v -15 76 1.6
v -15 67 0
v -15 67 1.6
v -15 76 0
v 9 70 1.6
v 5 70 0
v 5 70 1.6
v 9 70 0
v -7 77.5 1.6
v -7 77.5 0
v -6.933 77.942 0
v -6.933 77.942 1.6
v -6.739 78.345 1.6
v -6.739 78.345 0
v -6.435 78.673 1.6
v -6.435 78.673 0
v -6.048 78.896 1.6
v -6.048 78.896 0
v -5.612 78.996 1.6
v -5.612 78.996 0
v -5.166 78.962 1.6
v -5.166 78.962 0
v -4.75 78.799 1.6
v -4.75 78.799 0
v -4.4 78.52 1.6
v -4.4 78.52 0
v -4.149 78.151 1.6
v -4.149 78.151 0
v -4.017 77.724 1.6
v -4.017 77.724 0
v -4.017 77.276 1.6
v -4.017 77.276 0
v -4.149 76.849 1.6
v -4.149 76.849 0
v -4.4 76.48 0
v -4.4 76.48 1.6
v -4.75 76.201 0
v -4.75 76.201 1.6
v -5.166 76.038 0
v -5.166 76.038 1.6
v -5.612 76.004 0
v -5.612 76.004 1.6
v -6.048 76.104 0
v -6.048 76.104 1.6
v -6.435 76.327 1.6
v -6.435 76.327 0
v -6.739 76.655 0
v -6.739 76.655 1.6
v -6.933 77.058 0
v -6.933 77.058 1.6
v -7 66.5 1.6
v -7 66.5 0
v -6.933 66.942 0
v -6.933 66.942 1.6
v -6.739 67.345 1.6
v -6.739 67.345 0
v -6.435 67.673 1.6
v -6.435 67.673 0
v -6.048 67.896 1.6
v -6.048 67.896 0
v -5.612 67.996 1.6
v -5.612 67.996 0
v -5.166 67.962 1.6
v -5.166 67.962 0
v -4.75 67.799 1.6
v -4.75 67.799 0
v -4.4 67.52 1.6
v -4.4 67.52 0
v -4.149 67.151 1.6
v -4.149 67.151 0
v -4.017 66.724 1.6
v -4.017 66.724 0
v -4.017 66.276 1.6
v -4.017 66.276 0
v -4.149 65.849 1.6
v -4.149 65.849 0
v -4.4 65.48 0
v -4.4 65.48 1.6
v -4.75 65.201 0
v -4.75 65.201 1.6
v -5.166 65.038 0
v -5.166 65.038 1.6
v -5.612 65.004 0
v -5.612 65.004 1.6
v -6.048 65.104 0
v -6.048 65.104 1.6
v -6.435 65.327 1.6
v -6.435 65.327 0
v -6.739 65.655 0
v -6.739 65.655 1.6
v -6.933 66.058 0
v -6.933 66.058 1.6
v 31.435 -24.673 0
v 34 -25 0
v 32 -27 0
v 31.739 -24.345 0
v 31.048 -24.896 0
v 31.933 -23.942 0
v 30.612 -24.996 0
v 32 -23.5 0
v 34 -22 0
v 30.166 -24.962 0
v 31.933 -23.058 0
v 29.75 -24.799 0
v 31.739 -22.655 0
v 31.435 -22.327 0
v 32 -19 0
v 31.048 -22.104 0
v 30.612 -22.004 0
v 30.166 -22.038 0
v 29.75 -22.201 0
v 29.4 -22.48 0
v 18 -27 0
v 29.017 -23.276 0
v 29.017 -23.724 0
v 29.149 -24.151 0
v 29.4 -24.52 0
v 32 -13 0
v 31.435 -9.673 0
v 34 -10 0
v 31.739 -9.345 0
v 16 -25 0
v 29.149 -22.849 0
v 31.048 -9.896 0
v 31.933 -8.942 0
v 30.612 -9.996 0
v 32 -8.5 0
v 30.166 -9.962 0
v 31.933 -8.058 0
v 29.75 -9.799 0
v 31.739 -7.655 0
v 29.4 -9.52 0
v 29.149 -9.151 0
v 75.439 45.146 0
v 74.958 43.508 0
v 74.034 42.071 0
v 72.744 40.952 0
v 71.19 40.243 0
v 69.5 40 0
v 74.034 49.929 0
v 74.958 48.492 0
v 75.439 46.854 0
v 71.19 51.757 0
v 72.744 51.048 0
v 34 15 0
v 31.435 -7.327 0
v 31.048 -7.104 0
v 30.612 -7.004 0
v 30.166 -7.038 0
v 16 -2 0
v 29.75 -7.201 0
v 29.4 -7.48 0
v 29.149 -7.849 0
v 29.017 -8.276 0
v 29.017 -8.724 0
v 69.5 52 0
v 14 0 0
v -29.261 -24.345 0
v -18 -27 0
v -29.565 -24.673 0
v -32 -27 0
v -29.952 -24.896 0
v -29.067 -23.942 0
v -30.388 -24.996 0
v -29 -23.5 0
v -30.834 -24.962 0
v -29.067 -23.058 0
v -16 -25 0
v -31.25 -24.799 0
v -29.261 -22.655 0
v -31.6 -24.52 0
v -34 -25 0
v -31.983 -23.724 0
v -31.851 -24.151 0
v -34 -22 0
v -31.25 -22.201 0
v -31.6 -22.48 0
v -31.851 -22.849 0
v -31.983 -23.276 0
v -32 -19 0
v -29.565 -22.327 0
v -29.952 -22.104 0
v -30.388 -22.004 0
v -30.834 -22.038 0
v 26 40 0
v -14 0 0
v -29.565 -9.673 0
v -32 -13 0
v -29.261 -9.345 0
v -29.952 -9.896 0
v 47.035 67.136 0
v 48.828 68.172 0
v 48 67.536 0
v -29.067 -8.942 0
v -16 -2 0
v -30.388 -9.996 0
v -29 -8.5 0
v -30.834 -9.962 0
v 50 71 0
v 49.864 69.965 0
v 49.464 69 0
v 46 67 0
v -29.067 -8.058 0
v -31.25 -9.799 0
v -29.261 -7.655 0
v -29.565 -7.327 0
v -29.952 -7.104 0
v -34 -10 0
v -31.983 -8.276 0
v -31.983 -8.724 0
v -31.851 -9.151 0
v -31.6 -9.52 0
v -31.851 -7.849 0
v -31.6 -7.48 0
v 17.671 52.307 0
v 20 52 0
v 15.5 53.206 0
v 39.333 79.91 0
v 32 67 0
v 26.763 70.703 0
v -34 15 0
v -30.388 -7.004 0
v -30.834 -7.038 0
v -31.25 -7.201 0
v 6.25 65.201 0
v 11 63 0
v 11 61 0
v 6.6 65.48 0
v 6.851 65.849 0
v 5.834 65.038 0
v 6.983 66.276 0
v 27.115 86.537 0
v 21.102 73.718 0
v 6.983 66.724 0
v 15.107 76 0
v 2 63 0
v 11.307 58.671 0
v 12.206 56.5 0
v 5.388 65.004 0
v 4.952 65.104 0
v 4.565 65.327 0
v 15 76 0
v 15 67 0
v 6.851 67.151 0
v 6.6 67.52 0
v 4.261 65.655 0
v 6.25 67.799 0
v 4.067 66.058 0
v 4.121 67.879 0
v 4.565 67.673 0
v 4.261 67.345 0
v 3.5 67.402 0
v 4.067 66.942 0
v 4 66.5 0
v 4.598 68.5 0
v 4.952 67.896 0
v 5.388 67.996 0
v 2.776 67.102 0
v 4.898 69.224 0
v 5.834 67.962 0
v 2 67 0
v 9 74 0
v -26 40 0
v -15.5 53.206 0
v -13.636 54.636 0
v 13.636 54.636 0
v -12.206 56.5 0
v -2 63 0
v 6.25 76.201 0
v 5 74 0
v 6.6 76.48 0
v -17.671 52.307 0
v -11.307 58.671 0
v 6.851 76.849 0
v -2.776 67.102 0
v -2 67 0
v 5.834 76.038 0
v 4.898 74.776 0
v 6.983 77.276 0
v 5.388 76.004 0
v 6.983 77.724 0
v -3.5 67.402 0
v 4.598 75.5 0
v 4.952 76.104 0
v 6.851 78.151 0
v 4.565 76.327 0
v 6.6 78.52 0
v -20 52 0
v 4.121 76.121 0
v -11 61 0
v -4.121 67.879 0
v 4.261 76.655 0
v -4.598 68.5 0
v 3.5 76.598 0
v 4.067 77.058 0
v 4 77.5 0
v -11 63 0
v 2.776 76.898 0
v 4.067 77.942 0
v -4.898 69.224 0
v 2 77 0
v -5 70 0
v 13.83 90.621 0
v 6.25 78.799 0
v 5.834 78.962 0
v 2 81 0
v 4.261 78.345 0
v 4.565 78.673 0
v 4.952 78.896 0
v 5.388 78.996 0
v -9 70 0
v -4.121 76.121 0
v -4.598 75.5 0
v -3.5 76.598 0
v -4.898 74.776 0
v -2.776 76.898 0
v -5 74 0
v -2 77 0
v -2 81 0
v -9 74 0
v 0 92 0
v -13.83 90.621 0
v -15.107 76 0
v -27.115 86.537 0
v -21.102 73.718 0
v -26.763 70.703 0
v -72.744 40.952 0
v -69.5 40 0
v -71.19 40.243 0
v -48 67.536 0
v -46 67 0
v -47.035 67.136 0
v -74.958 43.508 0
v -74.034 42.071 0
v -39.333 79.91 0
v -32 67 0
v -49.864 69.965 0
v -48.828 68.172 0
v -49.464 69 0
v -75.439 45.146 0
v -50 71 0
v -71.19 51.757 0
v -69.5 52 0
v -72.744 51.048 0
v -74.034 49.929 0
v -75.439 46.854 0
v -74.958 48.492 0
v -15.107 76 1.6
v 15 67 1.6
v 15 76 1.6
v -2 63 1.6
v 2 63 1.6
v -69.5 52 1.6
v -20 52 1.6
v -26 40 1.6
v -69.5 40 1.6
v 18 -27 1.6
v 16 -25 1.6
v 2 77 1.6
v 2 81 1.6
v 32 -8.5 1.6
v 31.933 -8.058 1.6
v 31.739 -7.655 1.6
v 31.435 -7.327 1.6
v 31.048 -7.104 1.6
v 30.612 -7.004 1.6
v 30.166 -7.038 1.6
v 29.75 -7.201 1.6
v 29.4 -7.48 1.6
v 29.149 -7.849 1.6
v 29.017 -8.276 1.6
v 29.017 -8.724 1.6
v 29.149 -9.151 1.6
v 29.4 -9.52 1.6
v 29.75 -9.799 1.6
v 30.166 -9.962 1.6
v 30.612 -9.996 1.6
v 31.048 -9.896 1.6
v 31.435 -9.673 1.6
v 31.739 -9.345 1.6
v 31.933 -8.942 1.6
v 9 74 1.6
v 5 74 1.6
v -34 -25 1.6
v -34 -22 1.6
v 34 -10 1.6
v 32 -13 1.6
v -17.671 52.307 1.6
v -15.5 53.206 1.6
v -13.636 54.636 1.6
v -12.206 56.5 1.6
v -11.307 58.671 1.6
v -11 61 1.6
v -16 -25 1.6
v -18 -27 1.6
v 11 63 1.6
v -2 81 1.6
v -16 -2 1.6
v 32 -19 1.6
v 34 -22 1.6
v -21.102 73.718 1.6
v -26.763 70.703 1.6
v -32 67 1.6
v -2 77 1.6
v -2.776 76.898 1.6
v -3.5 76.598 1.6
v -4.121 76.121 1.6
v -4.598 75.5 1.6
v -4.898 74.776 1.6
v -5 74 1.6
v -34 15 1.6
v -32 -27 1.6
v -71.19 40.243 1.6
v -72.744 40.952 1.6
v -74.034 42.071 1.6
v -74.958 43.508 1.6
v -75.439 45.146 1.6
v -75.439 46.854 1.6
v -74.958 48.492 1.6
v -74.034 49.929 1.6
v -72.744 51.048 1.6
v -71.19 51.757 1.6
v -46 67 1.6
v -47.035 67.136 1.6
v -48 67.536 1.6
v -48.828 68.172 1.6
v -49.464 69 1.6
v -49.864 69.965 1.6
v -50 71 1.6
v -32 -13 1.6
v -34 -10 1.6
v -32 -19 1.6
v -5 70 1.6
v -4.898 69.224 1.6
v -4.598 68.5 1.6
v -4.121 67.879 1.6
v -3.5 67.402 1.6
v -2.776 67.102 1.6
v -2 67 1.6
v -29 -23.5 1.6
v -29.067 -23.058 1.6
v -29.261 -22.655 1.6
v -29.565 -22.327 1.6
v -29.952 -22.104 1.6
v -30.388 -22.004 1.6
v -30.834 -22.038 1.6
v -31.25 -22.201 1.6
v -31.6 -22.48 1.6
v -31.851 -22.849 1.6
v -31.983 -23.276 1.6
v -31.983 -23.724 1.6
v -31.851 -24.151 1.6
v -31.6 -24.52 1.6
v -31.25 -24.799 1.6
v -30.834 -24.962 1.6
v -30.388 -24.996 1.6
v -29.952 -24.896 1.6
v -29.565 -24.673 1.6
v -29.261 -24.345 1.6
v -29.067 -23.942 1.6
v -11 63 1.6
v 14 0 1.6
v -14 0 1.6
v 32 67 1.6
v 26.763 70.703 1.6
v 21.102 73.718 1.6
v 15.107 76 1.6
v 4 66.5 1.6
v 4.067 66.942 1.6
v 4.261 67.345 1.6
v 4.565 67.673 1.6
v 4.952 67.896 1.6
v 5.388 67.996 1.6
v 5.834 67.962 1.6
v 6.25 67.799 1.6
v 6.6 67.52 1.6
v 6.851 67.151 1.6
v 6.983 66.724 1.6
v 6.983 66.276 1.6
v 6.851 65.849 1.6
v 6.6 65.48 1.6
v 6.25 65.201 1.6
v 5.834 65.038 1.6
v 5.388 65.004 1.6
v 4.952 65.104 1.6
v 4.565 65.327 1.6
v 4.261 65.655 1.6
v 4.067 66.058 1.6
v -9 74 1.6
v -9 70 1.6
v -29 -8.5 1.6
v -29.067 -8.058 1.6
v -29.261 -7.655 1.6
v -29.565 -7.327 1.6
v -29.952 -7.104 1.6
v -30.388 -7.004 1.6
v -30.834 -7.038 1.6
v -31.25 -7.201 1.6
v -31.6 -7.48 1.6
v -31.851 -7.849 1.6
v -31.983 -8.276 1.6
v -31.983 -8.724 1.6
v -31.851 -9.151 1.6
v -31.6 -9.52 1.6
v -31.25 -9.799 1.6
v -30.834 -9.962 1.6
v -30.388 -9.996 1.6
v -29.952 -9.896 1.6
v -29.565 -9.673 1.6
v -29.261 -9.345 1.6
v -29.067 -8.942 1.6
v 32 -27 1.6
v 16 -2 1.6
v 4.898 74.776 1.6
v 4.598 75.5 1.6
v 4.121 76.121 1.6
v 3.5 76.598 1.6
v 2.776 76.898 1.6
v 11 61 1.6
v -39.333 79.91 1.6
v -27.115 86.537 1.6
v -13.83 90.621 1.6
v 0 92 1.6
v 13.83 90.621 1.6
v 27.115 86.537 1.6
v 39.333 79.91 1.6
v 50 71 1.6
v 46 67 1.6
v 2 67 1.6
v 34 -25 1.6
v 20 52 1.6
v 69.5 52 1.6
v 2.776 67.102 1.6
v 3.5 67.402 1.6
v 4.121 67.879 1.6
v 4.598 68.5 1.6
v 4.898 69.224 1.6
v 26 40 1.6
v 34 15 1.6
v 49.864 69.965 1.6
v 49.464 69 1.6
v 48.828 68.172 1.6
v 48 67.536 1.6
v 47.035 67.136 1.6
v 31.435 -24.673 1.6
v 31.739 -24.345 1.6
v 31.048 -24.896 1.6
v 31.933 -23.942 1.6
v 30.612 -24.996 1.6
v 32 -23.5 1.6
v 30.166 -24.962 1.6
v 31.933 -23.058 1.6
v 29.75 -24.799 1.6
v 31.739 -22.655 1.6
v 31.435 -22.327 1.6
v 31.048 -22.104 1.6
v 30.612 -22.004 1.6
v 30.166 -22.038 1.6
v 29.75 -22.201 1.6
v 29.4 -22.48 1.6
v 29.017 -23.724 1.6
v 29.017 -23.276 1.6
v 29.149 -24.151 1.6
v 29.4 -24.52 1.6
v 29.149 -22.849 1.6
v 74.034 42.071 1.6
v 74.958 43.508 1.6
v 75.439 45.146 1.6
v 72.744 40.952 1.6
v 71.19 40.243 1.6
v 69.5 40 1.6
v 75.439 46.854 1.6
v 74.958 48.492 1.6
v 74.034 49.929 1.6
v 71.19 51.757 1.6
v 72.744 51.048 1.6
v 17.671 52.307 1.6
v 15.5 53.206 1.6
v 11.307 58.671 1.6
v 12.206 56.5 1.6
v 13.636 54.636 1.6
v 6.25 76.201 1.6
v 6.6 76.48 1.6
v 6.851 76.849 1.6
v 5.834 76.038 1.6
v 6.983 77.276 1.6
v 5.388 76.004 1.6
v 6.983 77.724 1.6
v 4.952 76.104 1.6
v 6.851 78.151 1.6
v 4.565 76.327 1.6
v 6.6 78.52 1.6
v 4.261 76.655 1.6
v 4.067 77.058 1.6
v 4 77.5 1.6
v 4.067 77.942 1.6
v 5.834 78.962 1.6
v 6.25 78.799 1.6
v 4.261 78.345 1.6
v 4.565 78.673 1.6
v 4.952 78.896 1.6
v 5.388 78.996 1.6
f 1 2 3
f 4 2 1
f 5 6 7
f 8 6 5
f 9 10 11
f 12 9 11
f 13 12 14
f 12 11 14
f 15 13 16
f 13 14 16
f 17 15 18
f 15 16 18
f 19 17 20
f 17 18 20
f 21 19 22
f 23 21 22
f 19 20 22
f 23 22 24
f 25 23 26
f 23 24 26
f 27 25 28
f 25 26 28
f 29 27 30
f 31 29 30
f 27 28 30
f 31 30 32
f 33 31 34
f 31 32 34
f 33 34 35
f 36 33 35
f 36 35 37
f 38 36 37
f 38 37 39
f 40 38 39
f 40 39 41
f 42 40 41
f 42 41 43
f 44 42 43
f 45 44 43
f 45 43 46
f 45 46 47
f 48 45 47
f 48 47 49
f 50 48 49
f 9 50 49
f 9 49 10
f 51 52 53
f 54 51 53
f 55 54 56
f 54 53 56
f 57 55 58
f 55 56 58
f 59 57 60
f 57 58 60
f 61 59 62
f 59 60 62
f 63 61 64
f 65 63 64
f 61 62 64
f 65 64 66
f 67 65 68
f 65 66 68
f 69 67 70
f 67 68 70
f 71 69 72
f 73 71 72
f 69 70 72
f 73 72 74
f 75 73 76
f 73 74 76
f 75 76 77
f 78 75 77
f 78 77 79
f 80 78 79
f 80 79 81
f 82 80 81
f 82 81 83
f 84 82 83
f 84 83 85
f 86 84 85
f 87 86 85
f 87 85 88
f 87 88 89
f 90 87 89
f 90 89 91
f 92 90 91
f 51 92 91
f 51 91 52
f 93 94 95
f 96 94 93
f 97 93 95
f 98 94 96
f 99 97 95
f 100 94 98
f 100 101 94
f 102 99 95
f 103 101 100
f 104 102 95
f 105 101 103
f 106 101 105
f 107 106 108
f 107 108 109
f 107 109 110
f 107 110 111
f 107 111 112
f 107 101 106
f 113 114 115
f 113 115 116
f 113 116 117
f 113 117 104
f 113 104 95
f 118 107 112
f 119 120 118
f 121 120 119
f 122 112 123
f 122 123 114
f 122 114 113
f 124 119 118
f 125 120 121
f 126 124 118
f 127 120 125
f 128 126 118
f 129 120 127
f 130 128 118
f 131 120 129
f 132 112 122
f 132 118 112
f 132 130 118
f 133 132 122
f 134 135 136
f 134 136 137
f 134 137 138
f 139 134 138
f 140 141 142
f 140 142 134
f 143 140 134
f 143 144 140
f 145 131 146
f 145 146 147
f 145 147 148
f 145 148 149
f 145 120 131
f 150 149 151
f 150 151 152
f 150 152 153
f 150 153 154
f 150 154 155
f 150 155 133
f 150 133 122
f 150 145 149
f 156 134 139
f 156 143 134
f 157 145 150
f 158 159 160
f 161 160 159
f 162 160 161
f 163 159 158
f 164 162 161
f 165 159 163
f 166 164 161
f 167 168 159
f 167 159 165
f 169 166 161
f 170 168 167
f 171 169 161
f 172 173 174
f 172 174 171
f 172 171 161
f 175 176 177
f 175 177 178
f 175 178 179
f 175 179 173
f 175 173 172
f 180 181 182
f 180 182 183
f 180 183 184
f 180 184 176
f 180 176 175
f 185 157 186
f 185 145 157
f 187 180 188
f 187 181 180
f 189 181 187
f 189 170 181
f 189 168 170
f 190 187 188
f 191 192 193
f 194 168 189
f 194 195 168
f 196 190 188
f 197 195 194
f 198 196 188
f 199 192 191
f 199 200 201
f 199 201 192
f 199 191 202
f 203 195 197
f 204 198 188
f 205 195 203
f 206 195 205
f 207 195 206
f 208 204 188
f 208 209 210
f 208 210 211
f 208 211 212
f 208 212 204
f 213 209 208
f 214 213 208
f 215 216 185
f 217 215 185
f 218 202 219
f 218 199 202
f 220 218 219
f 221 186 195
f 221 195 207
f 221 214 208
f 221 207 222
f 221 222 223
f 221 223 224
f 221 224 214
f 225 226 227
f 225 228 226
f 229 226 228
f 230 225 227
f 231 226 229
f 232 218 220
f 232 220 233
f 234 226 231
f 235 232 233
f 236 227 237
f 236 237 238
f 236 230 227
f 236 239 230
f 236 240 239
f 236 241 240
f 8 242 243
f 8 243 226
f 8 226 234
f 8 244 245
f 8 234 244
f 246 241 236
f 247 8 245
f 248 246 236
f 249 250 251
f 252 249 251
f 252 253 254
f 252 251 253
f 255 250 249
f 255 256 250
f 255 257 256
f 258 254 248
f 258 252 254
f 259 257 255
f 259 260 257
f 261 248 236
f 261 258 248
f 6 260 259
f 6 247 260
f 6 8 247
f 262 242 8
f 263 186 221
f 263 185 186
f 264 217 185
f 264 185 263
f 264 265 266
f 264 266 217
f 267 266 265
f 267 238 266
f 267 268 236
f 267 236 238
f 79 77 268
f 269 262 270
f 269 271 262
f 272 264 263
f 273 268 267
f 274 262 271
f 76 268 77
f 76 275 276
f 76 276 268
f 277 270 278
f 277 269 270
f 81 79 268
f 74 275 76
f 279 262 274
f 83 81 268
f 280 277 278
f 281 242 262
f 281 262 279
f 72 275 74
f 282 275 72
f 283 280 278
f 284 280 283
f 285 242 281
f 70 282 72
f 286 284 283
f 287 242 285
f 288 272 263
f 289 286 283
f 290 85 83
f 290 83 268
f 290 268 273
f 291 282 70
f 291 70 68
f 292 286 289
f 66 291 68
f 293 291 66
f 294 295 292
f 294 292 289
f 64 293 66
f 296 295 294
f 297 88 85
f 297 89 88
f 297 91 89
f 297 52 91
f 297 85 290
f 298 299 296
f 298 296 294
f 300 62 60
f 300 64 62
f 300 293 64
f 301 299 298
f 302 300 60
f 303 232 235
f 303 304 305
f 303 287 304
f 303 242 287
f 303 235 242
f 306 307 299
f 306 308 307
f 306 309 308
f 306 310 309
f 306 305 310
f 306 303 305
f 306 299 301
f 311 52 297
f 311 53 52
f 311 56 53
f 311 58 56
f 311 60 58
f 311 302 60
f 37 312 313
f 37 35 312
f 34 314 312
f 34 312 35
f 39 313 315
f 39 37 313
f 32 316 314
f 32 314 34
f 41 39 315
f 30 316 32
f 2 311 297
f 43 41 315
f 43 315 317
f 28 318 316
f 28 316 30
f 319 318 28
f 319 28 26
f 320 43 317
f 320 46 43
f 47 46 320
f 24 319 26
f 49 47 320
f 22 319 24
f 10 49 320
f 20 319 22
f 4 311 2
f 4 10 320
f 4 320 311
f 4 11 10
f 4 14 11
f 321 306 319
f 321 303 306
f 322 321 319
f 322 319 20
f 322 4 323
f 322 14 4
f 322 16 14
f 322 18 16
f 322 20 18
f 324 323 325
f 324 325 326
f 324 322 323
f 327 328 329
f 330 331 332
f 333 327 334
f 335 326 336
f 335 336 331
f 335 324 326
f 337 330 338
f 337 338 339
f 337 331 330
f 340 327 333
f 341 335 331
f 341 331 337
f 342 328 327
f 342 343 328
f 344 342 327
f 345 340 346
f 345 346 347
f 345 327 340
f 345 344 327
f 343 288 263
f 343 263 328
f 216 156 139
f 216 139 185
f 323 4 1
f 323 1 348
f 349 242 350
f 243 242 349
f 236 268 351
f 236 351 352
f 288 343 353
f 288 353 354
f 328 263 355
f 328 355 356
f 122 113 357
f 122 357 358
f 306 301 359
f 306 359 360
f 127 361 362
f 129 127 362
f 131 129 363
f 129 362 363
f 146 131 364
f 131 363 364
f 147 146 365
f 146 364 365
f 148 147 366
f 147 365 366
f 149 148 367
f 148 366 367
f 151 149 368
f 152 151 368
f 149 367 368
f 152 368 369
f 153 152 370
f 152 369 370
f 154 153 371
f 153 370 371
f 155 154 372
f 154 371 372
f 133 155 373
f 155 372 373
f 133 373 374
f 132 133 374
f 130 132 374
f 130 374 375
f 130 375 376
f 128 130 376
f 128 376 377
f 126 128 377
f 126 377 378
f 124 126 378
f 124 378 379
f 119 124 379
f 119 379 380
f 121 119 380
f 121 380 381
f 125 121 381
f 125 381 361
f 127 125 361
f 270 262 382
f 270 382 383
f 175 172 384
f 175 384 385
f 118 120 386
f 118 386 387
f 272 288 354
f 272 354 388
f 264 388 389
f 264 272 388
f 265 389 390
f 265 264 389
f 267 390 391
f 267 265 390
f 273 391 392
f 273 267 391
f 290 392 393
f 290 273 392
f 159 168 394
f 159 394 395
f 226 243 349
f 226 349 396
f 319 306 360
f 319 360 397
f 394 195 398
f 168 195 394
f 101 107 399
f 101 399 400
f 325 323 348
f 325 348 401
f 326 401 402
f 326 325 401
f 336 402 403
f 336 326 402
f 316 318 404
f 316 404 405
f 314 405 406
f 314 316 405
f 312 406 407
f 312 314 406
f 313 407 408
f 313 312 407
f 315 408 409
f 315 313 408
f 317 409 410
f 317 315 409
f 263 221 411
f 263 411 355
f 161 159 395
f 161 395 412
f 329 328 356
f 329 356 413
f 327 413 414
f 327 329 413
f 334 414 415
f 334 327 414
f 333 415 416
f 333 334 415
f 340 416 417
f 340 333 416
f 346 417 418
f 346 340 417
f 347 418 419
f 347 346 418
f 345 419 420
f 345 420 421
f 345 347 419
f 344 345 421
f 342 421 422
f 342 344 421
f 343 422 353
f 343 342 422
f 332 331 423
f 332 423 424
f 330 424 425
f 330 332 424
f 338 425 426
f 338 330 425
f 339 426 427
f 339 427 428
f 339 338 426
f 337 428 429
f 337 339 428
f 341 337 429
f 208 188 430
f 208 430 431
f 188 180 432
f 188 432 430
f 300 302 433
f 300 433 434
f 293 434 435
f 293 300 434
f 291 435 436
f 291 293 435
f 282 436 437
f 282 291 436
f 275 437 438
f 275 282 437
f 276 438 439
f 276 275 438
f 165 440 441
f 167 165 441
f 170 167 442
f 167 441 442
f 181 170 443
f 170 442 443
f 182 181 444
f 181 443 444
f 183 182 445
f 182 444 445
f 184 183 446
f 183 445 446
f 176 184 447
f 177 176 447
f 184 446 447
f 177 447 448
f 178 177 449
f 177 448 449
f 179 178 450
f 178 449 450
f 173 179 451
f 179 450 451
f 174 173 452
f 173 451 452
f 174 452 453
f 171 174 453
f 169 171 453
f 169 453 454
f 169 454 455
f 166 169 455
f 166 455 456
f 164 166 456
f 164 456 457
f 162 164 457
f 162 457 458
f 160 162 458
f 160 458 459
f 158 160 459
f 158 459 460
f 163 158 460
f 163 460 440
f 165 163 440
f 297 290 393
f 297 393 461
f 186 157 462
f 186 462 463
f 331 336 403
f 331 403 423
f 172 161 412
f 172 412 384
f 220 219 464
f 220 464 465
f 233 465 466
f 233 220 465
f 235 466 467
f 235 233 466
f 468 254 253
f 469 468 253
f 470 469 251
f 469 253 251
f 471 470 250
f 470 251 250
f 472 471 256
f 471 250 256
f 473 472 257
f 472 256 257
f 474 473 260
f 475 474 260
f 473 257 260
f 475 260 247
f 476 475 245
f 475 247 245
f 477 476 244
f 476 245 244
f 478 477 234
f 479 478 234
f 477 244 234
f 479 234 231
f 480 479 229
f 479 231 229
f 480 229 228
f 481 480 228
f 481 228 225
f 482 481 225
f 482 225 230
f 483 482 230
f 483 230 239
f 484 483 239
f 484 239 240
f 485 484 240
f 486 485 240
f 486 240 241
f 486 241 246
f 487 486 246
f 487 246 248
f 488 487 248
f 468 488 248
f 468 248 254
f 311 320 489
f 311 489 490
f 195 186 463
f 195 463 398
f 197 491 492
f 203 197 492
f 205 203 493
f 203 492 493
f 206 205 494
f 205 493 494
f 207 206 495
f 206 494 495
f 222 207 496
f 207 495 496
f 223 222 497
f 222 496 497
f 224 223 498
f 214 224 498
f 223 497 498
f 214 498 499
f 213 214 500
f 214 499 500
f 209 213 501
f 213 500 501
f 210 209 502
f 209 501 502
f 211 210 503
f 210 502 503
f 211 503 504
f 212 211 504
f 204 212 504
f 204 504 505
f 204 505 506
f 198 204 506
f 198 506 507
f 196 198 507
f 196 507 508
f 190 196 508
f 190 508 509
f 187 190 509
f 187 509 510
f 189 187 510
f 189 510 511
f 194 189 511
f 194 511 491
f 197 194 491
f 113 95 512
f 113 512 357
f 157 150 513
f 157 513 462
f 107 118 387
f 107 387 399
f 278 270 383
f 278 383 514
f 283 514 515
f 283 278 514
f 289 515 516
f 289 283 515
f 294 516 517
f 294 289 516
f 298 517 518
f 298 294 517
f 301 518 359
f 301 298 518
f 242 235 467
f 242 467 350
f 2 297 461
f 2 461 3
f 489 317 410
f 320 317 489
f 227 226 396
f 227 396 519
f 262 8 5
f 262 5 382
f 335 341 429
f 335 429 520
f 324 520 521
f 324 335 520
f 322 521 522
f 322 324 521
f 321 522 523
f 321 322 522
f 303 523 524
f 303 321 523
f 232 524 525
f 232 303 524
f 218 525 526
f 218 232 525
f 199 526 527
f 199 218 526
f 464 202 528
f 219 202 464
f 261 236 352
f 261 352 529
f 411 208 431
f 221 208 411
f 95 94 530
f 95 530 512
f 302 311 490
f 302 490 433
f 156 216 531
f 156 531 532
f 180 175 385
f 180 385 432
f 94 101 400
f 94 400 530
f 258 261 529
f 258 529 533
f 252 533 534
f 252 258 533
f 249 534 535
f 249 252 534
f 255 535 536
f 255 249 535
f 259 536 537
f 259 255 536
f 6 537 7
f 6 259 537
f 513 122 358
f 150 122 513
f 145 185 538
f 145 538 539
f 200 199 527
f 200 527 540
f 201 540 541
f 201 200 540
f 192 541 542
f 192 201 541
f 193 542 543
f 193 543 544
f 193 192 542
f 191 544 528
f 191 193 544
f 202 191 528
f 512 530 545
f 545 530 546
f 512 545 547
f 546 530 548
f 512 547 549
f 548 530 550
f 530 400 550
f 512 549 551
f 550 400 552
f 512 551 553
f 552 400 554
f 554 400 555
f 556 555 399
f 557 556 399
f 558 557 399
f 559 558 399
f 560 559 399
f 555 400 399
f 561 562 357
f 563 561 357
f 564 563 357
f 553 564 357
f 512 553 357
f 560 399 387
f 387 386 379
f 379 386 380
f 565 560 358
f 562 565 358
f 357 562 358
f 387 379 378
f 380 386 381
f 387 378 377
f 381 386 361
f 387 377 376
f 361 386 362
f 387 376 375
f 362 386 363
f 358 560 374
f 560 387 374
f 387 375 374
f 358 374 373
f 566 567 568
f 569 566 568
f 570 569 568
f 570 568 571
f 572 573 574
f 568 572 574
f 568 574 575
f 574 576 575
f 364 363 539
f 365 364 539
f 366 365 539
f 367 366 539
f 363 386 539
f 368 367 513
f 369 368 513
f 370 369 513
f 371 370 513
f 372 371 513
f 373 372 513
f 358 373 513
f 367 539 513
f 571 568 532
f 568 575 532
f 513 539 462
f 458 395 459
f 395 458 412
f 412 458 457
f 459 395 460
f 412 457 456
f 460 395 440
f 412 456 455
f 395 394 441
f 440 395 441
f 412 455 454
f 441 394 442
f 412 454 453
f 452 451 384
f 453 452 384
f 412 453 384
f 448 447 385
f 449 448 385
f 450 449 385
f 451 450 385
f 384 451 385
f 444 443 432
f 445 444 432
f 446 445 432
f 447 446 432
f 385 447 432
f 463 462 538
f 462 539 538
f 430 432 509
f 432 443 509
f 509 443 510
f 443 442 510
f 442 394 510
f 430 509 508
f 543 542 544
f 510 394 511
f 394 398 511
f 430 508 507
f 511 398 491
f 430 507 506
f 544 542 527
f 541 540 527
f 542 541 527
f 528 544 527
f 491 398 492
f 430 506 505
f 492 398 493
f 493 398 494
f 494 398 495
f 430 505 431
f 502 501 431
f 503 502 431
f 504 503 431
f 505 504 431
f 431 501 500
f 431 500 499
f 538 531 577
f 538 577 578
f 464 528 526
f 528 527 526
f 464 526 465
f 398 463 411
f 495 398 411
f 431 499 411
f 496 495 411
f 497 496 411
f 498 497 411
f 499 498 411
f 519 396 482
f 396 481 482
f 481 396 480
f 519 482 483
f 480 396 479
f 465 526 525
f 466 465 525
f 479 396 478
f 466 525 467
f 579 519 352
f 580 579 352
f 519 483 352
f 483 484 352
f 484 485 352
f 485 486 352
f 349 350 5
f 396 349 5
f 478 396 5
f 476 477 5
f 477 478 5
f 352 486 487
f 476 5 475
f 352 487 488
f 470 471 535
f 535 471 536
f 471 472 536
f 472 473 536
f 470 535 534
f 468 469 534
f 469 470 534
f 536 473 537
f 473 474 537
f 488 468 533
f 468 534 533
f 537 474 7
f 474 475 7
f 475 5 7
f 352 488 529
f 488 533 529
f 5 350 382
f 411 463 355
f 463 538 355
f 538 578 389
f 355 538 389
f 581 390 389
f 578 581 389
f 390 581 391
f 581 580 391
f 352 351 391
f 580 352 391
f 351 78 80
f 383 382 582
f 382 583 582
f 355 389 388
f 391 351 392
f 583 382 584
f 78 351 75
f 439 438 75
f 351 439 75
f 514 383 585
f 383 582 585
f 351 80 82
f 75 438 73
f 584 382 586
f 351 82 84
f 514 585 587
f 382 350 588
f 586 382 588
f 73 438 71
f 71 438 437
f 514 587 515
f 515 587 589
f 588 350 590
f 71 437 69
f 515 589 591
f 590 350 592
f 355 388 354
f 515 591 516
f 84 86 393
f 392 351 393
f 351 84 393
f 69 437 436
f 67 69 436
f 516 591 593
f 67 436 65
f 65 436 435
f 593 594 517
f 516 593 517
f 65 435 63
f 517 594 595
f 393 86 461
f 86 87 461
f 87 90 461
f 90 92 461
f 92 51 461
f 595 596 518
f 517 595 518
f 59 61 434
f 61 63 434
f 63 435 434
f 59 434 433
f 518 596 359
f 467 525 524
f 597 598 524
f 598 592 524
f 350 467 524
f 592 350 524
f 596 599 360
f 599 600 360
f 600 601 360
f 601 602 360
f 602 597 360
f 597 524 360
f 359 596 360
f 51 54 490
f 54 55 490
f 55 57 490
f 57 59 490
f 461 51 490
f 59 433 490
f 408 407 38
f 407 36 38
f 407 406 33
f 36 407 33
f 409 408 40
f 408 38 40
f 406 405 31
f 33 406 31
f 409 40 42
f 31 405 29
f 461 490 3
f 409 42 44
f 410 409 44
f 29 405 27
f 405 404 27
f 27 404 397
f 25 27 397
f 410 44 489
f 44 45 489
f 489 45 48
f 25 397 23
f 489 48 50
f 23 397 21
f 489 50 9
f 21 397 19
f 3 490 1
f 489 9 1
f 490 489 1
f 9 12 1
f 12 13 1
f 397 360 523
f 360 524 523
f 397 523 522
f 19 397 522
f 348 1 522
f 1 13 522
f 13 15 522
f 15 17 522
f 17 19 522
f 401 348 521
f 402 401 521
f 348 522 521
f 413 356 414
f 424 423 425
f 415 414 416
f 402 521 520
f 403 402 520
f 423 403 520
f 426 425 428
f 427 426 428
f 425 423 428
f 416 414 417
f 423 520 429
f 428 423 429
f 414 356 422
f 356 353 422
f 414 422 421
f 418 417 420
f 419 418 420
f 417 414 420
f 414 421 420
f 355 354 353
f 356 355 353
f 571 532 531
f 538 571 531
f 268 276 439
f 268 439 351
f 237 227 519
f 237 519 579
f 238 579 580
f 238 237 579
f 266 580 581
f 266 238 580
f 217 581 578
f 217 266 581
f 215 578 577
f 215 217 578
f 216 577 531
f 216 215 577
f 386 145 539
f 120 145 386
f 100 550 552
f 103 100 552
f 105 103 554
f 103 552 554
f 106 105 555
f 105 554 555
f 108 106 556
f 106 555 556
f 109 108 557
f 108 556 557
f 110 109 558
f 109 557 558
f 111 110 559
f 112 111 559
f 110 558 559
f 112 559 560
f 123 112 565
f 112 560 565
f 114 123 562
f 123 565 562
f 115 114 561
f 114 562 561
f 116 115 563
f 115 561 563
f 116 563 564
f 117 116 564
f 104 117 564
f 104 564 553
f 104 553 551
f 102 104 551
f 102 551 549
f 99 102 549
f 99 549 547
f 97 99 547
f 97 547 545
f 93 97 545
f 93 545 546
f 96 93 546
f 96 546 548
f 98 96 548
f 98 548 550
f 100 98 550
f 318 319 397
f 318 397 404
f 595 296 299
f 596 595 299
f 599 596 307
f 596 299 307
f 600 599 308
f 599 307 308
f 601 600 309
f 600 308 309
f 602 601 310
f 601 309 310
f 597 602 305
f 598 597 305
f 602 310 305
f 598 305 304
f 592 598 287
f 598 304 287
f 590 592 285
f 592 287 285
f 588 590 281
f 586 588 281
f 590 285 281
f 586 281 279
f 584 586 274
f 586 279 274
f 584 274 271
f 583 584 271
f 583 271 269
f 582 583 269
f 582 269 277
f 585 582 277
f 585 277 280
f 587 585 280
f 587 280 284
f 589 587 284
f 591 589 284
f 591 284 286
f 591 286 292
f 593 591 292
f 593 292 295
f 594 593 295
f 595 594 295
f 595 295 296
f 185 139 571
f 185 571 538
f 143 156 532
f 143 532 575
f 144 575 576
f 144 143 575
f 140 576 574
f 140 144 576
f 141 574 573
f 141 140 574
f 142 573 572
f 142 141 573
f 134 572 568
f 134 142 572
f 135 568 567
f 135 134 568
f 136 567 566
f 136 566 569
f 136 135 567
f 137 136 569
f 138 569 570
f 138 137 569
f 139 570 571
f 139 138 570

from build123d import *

# Parameters (mm, degrees)
RESSALTO_EXTRUS_O1_DEPTH = 1.6
ESBO_O2_R                = 1.5
CORTE_EXTRUS_O2_DEPTH    = 2
ESBO_O3_R                = 1.5
CORTE_EXTRUS_O3_DEPTH    = 10
ESBO_O4_R                = 1.5
CORTE_EXTRUS_O4_DEPTH    = 10


with BuildPart() as part:
    # Esboço1 → Ressalto-extrusão1 (new body)
    with BuildSketch(Plane.XY):
        with BuildLine():
            Line((14, 0), (-14, 0))
            Line((-14, 0), (-16, -2))
            Line((-16, -2), (-16, -25))
            Line((-16, -25), (-18, -27))
            Line((-18, -27), (-32, -27))
            Line((-32, -27), (-34, -25))
            Line((-34, -25), (-34, -22))
            Line((-34, -22), (-32, -19))
            Line((-32, -19), (-32, -13))
            Line((-32, -13), (-34, -10))
            Line((-34, -10), (-34, 15))
            Line((-34, 15), (-26, 40))
            Line((-26, 40), (-69.5, 40))
            ThreePointArc((-69.5, 40), (-75.5, 46), (-69.5, 52))
            Line((-69.5, 52), (-20, 52))
            ThreePointArc((-20, 52), (-13.636038969, 54.636038969), (-11, 61))
            Line((-11, 61), (-11, 63))
            Line((-11, 63), (-15, 67))
            Line((-15, 67), (-15, 76))
            Line((-15, 76), (-15.107398643, 76))
            ThreePointArc((-15.107398643, 76), (-23.979715422, 72.299613351), (-32, 67))
            Line((-32, 67), (-46, 67))
            ThreePointArc((-46, 67), (-48.828427125, 68.171572875), (-50, 71))
            ThreePointArc((-50, 71), (0, 92), (50, 71))
            ThreePointArc((50, 71), (48.828427125, 68.171572875), (46, 67))
            Line((46, 67), (32, 67))
            ThreePointArc((32, 67), (23.979715422, 72.299613351), (15.107398643, 76))
            Line((15.107398643, 76), (15, 76))
            Line((15, 76), (15, 67))
            Line((15, 67), (11, 63))
            Line((11, 63), (11, 61))
            ThreePointArc((11, 61), (13.636038969, 54.636038969), (20, 52))
            Line((20, 52), (69.5, 52))
            ThreePointArc((69.5, 52), (75.5, 46), (69.5, 40))
            Line((69.5, 40), (26, 40))
            Line((26, 40), (34, 15))
            Line((34, 15), (34, -10))
            Line((34, -10), (32, -13))
            Line((32, -13), (32, -19))
            Line((32, -19), (34, -22))
            Line((34, -22), (34, -25))
            Line((34, -25), (32, -27))
            Line((32, -27), (18, -27))
            Line((18, -27), (16, -25))
            Line((16, -25), (16, -2))
            Line((16, -2), (14, 0))
        make_face()
    extrude(amount=RESSALTO_EXTRUS_O1_DEPTH)

    # Esboço2 → Corte-extrusão2 (cut)
    with BuildSketch(Plane(origin=(0, 0, 0), x_dir=(-1, 0, 0), z_dir=(0, 0, -1))):
        with Locations((5.5, 66.5)):
            Circle(ESBO_O2_R)
        with Locations((-5.5, 66.5)):
            Circle(ESBO_O2_R)
        with Locations((-5.5, 77.5)):
            Circle(ESBO_O2_R)
        with Locations((5.5, 77.5)):
            Circle(ESBO_O2_R)
        with BuildLine():
            Line((-5, 70), (-9, 70))
            Line((-9, 70), (-9, 74))
            Line((-9, 74), (-5, 74))
            ThreePointArc((-5, 74), (-4.121320344, 76.121320344), (-2, 77))
            Line((-2, 77), (-2, 81))
            Line((-2, 81), (2, 81))
            Line((2, 81), (2, 77))
            ThreePointArc((2, 77), (4.121320344, 76.121320344), (5, 74))
            Line((5, 74), (9, 74))
            Line((9, 74), (9, 70))
            Line((9, 70), (5, 70))
            ThreePointArc((5, 70), (4.121320344, 67.878679656), (2, 67))
            Line((2, 67), (2, 63))
            Line((2, 63), (-2, 63))
            Line((-2, 63), (-2, 67))
            ThreePointArc((-2, 67), (-4.121320344, 67.878679656), (-5, 70))
        make_face()
    extrude(amount=-CORTE_EXTRUS_O2_DEPTH, mode=Mode.SUBTRACT)

    # Esboço3 → Corte-extrusão3 (cut)
    with BuildSketch(Plane.XY.offset(1.6)):
        with Locations((-30.5, -23.5)):
            Circle(ESBO_O3_R)
        with Locations((30.5, -23.5)):
            Circle(ESBO_O3_R)
    extrude(amount=-CORTE_EXTRUS_O3_DEPTH, mode=Mode.SUBTRACT)

    # Esboço4 → Corte-extrusão4 (cut)
    with BuildSketch(Plane.XY.offset(1.6)):
        with Locations((-30.5, -8.5)):
            Circle(ESBO_O4_R)
        with Locations((30.5, -8.5)):
            Circle(ESBO_O4_R)
    extrude(amount=-CORTE_EXTRUS_O4_DEPTH, mode=Mode.SUBTRACT)


solid = part.part
